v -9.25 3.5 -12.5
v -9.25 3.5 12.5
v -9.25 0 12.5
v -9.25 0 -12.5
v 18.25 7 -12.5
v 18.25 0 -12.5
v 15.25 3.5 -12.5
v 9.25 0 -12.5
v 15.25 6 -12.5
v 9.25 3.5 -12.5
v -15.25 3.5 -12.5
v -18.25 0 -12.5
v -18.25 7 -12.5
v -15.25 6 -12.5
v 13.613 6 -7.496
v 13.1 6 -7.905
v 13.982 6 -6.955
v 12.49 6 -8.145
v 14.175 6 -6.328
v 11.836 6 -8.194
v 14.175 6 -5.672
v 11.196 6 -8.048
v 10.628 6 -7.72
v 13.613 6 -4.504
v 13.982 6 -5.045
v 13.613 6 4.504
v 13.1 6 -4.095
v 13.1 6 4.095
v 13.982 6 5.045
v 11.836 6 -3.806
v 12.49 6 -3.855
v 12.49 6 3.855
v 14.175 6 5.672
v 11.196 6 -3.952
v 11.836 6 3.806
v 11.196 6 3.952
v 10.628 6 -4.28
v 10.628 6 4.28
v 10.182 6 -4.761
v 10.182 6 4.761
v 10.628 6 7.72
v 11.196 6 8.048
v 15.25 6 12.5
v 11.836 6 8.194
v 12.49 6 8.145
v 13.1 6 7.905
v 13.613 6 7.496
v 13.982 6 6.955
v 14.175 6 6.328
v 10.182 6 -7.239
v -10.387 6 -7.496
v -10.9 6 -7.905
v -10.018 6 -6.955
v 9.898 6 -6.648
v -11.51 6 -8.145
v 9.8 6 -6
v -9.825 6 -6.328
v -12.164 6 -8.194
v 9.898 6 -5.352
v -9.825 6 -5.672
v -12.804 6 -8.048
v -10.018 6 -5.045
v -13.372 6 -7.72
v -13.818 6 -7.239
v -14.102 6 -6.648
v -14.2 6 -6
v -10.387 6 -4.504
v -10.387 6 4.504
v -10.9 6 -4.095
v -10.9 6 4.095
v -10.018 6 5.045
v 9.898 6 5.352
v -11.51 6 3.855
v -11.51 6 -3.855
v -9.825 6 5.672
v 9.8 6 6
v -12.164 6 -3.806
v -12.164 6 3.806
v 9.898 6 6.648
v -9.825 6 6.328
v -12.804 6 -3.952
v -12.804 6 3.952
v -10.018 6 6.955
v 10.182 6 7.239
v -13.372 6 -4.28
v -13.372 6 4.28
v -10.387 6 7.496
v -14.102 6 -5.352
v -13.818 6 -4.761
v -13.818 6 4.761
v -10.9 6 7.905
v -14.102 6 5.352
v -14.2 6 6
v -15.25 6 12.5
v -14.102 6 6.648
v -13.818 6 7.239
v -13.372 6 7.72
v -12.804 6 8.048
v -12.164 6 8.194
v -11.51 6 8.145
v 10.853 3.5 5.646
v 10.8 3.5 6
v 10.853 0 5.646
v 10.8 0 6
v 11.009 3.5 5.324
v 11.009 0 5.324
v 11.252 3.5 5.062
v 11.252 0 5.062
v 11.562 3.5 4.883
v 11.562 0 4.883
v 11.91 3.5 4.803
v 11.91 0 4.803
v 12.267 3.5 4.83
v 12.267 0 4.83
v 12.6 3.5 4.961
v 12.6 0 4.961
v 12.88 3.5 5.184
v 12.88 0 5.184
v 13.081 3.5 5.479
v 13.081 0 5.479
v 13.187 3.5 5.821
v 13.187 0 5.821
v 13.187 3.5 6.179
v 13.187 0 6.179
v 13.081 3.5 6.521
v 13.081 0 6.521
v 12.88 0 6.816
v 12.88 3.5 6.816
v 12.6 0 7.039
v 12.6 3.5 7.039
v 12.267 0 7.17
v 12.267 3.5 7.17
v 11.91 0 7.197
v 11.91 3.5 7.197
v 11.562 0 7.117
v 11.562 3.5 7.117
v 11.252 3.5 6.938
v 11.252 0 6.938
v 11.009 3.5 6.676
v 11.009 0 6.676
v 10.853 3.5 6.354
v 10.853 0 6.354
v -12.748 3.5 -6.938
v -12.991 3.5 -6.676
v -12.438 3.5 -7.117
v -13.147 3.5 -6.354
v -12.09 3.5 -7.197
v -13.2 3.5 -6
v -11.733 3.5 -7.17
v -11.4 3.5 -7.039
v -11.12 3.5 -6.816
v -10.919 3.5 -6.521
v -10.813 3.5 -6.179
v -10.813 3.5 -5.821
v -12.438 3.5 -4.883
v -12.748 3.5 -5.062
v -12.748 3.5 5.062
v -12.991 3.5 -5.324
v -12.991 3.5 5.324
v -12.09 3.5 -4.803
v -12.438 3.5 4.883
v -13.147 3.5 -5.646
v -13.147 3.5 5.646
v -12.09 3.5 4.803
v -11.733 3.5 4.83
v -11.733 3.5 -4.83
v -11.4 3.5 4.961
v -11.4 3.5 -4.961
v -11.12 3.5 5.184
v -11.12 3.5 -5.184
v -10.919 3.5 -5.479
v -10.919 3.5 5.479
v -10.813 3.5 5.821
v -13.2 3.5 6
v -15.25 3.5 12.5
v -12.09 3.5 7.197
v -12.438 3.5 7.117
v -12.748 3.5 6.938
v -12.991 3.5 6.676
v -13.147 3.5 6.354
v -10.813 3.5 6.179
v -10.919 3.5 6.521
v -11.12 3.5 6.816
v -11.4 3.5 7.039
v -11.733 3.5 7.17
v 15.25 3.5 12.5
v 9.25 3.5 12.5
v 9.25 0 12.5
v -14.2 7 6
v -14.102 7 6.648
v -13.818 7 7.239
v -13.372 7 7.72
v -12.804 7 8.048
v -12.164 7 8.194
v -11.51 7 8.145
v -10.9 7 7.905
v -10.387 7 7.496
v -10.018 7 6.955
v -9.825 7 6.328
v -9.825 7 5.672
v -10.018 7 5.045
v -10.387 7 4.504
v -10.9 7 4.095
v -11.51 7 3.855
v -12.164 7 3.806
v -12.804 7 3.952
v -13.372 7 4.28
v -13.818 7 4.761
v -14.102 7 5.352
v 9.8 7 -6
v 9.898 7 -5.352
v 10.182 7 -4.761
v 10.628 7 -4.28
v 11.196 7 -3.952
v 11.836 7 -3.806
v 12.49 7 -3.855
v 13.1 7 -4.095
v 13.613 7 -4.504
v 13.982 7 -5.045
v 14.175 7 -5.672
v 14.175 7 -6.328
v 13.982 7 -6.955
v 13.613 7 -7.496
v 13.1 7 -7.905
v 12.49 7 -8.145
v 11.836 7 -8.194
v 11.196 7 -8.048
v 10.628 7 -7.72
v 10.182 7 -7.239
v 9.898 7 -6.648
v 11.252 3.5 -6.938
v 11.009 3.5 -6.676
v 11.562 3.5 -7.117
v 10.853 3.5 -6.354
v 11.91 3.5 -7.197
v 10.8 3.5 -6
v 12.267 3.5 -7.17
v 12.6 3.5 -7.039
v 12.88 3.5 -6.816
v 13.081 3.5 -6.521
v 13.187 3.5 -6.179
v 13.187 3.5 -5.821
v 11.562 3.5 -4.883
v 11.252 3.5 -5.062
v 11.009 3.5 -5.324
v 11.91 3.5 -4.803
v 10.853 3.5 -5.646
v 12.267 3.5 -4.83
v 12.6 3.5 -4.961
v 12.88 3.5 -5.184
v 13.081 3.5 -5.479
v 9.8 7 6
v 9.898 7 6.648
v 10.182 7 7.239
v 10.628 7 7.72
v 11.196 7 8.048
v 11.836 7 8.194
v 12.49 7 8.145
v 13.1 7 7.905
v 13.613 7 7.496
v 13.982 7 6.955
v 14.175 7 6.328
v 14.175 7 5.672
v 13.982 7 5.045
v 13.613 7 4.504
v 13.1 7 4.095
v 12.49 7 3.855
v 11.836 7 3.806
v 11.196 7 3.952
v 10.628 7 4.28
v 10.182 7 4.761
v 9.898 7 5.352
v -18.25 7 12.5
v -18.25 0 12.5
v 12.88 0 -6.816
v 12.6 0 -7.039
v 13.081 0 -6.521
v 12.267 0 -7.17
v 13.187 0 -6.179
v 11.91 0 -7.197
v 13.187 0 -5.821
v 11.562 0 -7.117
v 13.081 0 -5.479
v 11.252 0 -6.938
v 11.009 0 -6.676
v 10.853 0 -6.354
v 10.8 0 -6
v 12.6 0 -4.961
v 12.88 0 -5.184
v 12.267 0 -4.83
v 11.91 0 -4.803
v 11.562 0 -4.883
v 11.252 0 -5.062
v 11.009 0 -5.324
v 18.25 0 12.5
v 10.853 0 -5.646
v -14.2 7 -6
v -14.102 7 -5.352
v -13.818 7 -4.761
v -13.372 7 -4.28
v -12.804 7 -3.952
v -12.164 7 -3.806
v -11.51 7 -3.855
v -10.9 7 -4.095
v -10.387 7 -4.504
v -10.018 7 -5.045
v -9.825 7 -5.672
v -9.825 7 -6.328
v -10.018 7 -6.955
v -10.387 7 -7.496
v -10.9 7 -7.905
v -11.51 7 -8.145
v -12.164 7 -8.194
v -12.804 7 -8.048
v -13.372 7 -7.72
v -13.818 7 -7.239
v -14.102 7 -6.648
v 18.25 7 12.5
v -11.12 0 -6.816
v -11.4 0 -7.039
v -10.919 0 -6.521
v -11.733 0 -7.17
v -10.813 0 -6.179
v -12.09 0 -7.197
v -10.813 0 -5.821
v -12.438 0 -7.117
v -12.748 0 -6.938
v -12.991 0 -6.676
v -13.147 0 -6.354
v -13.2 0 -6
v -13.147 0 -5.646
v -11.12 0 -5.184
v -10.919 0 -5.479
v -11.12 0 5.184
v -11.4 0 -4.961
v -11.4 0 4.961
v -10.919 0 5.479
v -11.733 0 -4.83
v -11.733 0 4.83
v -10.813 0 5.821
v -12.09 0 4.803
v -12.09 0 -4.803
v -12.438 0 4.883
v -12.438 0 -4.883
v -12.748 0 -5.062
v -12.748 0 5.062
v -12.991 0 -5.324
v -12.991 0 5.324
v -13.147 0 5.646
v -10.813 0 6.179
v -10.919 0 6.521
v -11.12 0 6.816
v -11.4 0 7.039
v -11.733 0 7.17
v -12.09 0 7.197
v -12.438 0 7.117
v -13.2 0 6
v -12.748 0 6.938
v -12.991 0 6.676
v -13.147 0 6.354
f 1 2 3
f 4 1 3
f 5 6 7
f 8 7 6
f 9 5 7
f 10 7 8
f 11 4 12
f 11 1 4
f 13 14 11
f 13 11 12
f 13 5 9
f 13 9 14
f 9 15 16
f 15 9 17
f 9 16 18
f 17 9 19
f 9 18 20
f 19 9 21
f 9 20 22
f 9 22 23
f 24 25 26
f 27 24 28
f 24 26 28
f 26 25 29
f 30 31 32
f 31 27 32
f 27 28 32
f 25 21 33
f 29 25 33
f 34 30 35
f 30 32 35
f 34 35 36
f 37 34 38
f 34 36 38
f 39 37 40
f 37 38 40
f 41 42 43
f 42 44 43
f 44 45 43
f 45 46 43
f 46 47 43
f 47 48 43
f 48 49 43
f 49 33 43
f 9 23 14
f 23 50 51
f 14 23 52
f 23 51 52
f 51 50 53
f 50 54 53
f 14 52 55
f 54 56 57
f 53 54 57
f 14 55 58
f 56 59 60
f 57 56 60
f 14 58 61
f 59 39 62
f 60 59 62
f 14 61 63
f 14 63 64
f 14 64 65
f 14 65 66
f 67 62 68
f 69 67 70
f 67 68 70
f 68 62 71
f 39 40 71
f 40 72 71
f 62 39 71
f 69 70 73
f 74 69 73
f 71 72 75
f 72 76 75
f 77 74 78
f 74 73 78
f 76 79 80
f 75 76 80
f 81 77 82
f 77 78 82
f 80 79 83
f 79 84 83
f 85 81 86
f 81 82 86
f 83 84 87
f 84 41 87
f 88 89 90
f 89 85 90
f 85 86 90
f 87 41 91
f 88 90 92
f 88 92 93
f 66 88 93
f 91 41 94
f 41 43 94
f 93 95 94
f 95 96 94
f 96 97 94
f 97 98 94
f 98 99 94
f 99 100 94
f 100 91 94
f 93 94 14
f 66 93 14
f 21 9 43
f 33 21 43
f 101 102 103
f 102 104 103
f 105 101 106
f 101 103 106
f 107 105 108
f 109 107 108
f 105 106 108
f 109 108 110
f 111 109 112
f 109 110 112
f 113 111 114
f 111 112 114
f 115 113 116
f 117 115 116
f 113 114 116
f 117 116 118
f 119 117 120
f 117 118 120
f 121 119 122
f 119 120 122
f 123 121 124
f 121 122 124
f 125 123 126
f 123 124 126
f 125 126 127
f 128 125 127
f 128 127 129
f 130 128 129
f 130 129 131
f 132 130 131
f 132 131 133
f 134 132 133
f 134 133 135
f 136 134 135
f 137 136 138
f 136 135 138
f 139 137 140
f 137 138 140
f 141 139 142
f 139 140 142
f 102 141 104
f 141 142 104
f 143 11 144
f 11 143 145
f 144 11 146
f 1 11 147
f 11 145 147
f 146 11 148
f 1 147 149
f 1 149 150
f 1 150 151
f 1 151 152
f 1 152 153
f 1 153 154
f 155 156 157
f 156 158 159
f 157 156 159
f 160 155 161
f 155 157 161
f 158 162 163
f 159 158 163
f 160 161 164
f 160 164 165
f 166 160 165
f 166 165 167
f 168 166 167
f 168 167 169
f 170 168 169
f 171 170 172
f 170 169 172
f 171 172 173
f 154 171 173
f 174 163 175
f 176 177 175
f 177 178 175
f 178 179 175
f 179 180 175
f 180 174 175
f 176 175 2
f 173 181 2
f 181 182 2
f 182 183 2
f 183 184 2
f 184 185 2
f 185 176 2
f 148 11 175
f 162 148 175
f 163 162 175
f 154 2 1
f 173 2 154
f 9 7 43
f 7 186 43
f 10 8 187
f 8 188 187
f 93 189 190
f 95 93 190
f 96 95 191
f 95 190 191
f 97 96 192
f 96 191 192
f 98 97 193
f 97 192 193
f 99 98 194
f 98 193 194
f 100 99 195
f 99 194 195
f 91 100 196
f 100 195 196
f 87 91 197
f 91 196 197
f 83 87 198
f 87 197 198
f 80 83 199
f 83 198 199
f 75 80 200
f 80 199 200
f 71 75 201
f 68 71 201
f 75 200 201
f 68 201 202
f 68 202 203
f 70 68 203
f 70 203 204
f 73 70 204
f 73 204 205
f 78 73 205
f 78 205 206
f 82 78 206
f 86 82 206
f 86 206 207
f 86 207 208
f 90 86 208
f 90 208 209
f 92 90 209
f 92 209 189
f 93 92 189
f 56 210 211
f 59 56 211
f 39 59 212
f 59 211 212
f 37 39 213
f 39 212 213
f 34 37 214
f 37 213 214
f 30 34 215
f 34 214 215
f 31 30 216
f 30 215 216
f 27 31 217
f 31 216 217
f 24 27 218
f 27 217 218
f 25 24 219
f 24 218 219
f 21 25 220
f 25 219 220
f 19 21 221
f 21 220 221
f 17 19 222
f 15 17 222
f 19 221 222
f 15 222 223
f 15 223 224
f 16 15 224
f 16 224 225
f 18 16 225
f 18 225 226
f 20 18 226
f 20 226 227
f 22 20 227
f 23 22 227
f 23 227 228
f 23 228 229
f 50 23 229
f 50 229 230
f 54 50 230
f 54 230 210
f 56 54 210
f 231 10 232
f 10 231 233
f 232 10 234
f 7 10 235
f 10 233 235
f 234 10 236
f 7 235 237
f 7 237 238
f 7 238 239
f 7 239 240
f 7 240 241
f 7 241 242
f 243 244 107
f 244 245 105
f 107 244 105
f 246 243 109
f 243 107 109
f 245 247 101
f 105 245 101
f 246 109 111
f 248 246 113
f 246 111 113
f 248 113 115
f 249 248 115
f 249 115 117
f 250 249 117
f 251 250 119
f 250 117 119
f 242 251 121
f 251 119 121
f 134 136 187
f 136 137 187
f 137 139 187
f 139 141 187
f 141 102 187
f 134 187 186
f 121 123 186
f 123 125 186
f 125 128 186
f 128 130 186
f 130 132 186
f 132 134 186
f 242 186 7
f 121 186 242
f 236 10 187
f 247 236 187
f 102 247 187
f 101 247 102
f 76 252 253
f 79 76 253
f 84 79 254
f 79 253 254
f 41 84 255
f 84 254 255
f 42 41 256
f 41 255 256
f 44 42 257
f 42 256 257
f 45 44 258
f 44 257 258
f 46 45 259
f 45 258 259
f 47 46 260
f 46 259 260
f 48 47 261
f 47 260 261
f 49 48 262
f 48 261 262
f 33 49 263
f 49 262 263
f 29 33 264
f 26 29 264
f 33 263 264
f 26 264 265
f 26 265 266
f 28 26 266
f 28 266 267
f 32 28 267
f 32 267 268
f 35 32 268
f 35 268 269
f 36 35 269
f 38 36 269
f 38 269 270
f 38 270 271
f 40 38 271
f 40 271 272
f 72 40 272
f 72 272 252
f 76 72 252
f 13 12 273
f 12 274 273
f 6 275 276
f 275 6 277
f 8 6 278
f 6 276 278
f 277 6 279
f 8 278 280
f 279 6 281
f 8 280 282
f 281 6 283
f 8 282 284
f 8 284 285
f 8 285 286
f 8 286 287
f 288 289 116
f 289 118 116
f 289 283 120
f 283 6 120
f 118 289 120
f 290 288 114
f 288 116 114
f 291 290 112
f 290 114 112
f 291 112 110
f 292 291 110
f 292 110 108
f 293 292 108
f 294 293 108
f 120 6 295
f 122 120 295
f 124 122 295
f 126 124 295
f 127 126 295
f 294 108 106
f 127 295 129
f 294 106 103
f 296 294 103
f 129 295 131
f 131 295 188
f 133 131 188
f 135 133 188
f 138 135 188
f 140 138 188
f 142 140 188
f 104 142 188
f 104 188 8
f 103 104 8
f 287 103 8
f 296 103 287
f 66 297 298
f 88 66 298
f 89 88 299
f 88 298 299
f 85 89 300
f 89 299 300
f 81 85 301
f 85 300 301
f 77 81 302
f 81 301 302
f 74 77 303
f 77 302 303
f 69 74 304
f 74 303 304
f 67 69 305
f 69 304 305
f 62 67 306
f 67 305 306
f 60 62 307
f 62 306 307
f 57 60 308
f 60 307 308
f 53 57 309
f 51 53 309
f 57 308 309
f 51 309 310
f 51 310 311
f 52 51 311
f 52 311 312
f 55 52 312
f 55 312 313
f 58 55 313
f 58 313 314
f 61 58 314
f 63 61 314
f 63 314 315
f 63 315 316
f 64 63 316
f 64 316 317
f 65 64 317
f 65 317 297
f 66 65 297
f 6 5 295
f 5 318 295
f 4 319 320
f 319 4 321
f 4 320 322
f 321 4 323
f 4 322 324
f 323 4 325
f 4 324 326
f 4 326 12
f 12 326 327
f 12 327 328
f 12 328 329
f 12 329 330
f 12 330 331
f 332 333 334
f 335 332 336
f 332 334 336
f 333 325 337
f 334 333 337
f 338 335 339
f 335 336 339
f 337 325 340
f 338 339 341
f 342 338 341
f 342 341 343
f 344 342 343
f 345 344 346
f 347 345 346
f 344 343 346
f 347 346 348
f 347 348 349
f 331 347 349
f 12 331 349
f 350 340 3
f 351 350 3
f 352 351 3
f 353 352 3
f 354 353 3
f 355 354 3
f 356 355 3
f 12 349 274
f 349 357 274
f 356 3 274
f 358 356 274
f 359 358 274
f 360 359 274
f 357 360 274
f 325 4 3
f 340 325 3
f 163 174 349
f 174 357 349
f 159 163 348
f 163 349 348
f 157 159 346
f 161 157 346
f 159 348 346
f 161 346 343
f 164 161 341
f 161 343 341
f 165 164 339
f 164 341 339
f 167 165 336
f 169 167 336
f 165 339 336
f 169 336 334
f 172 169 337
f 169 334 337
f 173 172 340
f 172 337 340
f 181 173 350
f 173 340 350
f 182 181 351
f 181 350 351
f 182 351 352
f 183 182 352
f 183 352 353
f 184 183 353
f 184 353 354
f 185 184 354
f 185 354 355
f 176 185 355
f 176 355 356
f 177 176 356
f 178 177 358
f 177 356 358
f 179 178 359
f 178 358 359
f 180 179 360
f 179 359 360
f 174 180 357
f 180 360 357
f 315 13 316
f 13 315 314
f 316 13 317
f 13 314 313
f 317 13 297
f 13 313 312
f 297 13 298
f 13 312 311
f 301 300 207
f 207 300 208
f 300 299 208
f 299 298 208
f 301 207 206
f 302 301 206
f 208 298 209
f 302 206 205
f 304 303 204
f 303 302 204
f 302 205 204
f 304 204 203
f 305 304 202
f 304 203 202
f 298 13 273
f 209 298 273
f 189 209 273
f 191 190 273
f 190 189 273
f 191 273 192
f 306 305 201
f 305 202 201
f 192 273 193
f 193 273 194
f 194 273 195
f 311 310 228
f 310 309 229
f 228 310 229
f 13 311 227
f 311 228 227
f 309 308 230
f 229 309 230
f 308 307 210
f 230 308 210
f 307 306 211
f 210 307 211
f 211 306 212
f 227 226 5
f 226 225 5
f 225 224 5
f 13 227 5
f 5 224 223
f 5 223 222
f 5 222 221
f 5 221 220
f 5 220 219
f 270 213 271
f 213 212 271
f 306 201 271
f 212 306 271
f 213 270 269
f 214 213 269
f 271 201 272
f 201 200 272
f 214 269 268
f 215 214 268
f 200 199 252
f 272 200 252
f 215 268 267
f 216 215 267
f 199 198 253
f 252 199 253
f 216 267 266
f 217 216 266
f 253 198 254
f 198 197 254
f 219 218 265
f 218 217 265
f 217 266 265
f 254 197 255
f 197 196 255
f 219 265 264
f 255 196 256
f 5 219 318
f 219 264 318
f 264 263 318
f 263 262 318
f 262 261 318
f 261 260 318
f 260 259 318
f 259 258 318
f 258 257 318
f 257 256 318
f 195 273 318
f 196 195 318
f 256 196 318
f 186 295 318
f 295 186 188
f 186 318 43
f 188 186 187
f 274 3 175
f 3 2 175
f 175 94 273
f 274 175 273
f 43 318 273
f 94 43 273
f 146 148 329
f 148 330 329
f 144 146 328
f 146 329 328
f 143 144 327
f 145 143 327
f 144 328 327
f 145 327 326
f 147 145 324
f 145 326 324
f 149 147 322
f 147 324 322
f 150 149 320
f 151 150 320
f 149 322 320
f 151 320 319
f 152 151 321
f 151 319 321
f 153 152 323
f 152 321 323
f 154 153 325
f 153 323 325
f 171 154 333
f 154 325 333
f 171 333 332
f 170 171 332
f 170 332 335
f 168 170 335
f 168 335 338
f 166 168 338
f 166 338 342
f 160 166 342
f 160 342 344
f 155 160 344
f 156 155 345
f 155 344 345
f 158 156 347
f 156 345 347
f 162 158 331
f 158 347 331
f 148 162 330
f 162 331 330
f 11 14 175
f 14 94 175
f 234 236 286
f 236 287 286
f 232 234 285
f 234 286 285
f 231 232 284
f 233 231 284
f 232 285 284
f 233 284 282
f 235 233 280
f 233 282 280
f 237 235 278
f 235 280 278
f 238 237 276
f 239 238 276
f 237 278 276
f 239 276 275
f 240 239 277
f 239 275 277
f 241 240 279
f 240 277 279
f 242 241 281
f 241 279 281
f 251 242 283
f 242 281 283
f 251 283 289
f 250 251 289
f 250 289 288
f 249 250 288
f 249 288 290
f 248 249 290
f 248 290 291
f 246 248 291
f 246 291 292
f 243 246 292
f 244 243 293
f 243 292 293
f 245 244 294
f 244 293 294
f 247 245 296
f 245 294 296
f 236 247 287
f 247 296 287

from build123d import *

# Parameters (mm, degrees)
EXTRUDE_3_DEPTH             = 12.5
HOLE_WIZARD_M21_D           = 2.4
HOLE_WIZARD_M21_CSINK_D     = 4.4
HOLE_WIZARD_M21_CSINK_ANGLE = 90
CUT_EXTRUDE_1_REACH         = 25.202
SKETCH_6_R                  = 2.2


with BuildPart() as part:
    # Эскиз3 → Бобышка-Вытянуть3 (new, symmetric)
    with BuildSketch(Plane.XY):
        Polygon((-9.25, 0), (-18.25, 0), (-18.25, 7), (18.25, 7), (18.25, 0), (9.25, 0), (9.25, 3.5), (15.25, 3.5), (15.25, 6), (-15.25, 6), (-15.25, 3.5), (-9.25, 3.5), align=None)
    extrude(amount=EXTRUDE_3_DEPTH, both=True)

    # Зенковка для винта с потайной головкой M21 (through all)
    with Locations(Plane(origin=(0, 7, 0), x_dir=(1, 0, 0), z_dir=(0, 1, 0))):
        with Locations((-12, 6), (-12, -6), (12, -6), (12, 6)):
            CounterSinkHole(HOLE_WIZARD_M21_D / 2, HOLE_WIZARD_M21_CSINK_D / 2, counter_sink_angle=HOLE_WIZARD_M21_CSINK_ANGLE)

    # Эскиз6 → Вырез-Вытянуть1 (cut, up to next)
    with BuildSketch(Plane(origin=(0, 7, 0), x_dir=(1, 0, 0), z_dir=(0, 1, 0)), mode=Mode.PRIVATE) as cut_extrude_1_sk1:
        with Locations(Location((-12, -6, 0), (0, 0, 180))):
            Circle(SKETCH_6_R)
    cut_extrude_1_tool1 = extrude(cut_extrude_1_sk1.sketch, amount=-CUT_EXTRUDE_1_REACH, mode=Mode.PRIVATE) & part.part
    # Эскиз6 → Вырез-Вытянуть1 (cut, up to next)
    with BuildSketch(Plane(origin=(0, 7, 0), x_dir=(1, 0, 0), z_dir=(0, 1, 0)), mode=Mode.PRIVATE) as cut_extrude_1_sk2:
        with Locations(Location((12, -6, 0), (0, 0, 180))):
            Circle(SKETCH_6_R)
    cut_extrude_1_tool2 = extrude(cut_extrude_1_sk2.sketch, amount=-CUT_EXTRUDE_1_REACH, mode=Mode.PRIVATE) & part.part
    # Эскиз6 → Вырез-Вытянуть1 (cut, up to next)
    with BuildSketch(Plane(origin=(0, 7, 0), x_dir=(1, 0, 0), z_dir=(0, 1, 0)), mode=Mode.PRIVATE) as cut_extrude_1_sk3:
        with Locations(Location((12, 6, 0), (0, 0, 180))):
            Circle(SKETCH_6_R)
    cut_extrude_1_tool3 = extrude(cut_extrude_1_sk3.sketch, amount=-CUT_EXTRUDE_1_REACH, mode=Mode.PRIVATE) & part.part
    # Эскиз6 → Вырез-Вытянуть1 (cut, up to next)
    with BuildSketch(Plane(origin=(0, 7, 0), x_dir=(1, 0, 0), z_dir=(0, 1, 0)), mode=Mode.PRIVATE) as cut_extrude_1_sk4:
        with Locations(Location((-12, 6, 0), (0, 0, 180))):
            Circle(SKETCH_6_R)
    cut_extrude_1_tool4 = extrude(cut_extrude_1_sk4.sketch, amount=-CUT_EXTRUDE_1_REACH, mode=Mode.PRIVATE) & part.part
    add(cut_extrude_1_tool1.solids().sort_by_distance((-12, 7, 6))[0], mode=Mode.SUBTRACT)
    add(cut_extrude_1_tool2.solids().sort_by_distance((12, 7, 6))[0], mode=Mode.SUBTRACT)
    add(cut_extrude_1_tool3.solids().sort_by_distance((12, 7, -6))[0], mode=Mode.SUBTRACT)
    add(cut_extrude_1_tool4.solids().sort_by_distance((-12, 7, -6))[0], mode=Mode.SUBTRACT)


solid = part.part
